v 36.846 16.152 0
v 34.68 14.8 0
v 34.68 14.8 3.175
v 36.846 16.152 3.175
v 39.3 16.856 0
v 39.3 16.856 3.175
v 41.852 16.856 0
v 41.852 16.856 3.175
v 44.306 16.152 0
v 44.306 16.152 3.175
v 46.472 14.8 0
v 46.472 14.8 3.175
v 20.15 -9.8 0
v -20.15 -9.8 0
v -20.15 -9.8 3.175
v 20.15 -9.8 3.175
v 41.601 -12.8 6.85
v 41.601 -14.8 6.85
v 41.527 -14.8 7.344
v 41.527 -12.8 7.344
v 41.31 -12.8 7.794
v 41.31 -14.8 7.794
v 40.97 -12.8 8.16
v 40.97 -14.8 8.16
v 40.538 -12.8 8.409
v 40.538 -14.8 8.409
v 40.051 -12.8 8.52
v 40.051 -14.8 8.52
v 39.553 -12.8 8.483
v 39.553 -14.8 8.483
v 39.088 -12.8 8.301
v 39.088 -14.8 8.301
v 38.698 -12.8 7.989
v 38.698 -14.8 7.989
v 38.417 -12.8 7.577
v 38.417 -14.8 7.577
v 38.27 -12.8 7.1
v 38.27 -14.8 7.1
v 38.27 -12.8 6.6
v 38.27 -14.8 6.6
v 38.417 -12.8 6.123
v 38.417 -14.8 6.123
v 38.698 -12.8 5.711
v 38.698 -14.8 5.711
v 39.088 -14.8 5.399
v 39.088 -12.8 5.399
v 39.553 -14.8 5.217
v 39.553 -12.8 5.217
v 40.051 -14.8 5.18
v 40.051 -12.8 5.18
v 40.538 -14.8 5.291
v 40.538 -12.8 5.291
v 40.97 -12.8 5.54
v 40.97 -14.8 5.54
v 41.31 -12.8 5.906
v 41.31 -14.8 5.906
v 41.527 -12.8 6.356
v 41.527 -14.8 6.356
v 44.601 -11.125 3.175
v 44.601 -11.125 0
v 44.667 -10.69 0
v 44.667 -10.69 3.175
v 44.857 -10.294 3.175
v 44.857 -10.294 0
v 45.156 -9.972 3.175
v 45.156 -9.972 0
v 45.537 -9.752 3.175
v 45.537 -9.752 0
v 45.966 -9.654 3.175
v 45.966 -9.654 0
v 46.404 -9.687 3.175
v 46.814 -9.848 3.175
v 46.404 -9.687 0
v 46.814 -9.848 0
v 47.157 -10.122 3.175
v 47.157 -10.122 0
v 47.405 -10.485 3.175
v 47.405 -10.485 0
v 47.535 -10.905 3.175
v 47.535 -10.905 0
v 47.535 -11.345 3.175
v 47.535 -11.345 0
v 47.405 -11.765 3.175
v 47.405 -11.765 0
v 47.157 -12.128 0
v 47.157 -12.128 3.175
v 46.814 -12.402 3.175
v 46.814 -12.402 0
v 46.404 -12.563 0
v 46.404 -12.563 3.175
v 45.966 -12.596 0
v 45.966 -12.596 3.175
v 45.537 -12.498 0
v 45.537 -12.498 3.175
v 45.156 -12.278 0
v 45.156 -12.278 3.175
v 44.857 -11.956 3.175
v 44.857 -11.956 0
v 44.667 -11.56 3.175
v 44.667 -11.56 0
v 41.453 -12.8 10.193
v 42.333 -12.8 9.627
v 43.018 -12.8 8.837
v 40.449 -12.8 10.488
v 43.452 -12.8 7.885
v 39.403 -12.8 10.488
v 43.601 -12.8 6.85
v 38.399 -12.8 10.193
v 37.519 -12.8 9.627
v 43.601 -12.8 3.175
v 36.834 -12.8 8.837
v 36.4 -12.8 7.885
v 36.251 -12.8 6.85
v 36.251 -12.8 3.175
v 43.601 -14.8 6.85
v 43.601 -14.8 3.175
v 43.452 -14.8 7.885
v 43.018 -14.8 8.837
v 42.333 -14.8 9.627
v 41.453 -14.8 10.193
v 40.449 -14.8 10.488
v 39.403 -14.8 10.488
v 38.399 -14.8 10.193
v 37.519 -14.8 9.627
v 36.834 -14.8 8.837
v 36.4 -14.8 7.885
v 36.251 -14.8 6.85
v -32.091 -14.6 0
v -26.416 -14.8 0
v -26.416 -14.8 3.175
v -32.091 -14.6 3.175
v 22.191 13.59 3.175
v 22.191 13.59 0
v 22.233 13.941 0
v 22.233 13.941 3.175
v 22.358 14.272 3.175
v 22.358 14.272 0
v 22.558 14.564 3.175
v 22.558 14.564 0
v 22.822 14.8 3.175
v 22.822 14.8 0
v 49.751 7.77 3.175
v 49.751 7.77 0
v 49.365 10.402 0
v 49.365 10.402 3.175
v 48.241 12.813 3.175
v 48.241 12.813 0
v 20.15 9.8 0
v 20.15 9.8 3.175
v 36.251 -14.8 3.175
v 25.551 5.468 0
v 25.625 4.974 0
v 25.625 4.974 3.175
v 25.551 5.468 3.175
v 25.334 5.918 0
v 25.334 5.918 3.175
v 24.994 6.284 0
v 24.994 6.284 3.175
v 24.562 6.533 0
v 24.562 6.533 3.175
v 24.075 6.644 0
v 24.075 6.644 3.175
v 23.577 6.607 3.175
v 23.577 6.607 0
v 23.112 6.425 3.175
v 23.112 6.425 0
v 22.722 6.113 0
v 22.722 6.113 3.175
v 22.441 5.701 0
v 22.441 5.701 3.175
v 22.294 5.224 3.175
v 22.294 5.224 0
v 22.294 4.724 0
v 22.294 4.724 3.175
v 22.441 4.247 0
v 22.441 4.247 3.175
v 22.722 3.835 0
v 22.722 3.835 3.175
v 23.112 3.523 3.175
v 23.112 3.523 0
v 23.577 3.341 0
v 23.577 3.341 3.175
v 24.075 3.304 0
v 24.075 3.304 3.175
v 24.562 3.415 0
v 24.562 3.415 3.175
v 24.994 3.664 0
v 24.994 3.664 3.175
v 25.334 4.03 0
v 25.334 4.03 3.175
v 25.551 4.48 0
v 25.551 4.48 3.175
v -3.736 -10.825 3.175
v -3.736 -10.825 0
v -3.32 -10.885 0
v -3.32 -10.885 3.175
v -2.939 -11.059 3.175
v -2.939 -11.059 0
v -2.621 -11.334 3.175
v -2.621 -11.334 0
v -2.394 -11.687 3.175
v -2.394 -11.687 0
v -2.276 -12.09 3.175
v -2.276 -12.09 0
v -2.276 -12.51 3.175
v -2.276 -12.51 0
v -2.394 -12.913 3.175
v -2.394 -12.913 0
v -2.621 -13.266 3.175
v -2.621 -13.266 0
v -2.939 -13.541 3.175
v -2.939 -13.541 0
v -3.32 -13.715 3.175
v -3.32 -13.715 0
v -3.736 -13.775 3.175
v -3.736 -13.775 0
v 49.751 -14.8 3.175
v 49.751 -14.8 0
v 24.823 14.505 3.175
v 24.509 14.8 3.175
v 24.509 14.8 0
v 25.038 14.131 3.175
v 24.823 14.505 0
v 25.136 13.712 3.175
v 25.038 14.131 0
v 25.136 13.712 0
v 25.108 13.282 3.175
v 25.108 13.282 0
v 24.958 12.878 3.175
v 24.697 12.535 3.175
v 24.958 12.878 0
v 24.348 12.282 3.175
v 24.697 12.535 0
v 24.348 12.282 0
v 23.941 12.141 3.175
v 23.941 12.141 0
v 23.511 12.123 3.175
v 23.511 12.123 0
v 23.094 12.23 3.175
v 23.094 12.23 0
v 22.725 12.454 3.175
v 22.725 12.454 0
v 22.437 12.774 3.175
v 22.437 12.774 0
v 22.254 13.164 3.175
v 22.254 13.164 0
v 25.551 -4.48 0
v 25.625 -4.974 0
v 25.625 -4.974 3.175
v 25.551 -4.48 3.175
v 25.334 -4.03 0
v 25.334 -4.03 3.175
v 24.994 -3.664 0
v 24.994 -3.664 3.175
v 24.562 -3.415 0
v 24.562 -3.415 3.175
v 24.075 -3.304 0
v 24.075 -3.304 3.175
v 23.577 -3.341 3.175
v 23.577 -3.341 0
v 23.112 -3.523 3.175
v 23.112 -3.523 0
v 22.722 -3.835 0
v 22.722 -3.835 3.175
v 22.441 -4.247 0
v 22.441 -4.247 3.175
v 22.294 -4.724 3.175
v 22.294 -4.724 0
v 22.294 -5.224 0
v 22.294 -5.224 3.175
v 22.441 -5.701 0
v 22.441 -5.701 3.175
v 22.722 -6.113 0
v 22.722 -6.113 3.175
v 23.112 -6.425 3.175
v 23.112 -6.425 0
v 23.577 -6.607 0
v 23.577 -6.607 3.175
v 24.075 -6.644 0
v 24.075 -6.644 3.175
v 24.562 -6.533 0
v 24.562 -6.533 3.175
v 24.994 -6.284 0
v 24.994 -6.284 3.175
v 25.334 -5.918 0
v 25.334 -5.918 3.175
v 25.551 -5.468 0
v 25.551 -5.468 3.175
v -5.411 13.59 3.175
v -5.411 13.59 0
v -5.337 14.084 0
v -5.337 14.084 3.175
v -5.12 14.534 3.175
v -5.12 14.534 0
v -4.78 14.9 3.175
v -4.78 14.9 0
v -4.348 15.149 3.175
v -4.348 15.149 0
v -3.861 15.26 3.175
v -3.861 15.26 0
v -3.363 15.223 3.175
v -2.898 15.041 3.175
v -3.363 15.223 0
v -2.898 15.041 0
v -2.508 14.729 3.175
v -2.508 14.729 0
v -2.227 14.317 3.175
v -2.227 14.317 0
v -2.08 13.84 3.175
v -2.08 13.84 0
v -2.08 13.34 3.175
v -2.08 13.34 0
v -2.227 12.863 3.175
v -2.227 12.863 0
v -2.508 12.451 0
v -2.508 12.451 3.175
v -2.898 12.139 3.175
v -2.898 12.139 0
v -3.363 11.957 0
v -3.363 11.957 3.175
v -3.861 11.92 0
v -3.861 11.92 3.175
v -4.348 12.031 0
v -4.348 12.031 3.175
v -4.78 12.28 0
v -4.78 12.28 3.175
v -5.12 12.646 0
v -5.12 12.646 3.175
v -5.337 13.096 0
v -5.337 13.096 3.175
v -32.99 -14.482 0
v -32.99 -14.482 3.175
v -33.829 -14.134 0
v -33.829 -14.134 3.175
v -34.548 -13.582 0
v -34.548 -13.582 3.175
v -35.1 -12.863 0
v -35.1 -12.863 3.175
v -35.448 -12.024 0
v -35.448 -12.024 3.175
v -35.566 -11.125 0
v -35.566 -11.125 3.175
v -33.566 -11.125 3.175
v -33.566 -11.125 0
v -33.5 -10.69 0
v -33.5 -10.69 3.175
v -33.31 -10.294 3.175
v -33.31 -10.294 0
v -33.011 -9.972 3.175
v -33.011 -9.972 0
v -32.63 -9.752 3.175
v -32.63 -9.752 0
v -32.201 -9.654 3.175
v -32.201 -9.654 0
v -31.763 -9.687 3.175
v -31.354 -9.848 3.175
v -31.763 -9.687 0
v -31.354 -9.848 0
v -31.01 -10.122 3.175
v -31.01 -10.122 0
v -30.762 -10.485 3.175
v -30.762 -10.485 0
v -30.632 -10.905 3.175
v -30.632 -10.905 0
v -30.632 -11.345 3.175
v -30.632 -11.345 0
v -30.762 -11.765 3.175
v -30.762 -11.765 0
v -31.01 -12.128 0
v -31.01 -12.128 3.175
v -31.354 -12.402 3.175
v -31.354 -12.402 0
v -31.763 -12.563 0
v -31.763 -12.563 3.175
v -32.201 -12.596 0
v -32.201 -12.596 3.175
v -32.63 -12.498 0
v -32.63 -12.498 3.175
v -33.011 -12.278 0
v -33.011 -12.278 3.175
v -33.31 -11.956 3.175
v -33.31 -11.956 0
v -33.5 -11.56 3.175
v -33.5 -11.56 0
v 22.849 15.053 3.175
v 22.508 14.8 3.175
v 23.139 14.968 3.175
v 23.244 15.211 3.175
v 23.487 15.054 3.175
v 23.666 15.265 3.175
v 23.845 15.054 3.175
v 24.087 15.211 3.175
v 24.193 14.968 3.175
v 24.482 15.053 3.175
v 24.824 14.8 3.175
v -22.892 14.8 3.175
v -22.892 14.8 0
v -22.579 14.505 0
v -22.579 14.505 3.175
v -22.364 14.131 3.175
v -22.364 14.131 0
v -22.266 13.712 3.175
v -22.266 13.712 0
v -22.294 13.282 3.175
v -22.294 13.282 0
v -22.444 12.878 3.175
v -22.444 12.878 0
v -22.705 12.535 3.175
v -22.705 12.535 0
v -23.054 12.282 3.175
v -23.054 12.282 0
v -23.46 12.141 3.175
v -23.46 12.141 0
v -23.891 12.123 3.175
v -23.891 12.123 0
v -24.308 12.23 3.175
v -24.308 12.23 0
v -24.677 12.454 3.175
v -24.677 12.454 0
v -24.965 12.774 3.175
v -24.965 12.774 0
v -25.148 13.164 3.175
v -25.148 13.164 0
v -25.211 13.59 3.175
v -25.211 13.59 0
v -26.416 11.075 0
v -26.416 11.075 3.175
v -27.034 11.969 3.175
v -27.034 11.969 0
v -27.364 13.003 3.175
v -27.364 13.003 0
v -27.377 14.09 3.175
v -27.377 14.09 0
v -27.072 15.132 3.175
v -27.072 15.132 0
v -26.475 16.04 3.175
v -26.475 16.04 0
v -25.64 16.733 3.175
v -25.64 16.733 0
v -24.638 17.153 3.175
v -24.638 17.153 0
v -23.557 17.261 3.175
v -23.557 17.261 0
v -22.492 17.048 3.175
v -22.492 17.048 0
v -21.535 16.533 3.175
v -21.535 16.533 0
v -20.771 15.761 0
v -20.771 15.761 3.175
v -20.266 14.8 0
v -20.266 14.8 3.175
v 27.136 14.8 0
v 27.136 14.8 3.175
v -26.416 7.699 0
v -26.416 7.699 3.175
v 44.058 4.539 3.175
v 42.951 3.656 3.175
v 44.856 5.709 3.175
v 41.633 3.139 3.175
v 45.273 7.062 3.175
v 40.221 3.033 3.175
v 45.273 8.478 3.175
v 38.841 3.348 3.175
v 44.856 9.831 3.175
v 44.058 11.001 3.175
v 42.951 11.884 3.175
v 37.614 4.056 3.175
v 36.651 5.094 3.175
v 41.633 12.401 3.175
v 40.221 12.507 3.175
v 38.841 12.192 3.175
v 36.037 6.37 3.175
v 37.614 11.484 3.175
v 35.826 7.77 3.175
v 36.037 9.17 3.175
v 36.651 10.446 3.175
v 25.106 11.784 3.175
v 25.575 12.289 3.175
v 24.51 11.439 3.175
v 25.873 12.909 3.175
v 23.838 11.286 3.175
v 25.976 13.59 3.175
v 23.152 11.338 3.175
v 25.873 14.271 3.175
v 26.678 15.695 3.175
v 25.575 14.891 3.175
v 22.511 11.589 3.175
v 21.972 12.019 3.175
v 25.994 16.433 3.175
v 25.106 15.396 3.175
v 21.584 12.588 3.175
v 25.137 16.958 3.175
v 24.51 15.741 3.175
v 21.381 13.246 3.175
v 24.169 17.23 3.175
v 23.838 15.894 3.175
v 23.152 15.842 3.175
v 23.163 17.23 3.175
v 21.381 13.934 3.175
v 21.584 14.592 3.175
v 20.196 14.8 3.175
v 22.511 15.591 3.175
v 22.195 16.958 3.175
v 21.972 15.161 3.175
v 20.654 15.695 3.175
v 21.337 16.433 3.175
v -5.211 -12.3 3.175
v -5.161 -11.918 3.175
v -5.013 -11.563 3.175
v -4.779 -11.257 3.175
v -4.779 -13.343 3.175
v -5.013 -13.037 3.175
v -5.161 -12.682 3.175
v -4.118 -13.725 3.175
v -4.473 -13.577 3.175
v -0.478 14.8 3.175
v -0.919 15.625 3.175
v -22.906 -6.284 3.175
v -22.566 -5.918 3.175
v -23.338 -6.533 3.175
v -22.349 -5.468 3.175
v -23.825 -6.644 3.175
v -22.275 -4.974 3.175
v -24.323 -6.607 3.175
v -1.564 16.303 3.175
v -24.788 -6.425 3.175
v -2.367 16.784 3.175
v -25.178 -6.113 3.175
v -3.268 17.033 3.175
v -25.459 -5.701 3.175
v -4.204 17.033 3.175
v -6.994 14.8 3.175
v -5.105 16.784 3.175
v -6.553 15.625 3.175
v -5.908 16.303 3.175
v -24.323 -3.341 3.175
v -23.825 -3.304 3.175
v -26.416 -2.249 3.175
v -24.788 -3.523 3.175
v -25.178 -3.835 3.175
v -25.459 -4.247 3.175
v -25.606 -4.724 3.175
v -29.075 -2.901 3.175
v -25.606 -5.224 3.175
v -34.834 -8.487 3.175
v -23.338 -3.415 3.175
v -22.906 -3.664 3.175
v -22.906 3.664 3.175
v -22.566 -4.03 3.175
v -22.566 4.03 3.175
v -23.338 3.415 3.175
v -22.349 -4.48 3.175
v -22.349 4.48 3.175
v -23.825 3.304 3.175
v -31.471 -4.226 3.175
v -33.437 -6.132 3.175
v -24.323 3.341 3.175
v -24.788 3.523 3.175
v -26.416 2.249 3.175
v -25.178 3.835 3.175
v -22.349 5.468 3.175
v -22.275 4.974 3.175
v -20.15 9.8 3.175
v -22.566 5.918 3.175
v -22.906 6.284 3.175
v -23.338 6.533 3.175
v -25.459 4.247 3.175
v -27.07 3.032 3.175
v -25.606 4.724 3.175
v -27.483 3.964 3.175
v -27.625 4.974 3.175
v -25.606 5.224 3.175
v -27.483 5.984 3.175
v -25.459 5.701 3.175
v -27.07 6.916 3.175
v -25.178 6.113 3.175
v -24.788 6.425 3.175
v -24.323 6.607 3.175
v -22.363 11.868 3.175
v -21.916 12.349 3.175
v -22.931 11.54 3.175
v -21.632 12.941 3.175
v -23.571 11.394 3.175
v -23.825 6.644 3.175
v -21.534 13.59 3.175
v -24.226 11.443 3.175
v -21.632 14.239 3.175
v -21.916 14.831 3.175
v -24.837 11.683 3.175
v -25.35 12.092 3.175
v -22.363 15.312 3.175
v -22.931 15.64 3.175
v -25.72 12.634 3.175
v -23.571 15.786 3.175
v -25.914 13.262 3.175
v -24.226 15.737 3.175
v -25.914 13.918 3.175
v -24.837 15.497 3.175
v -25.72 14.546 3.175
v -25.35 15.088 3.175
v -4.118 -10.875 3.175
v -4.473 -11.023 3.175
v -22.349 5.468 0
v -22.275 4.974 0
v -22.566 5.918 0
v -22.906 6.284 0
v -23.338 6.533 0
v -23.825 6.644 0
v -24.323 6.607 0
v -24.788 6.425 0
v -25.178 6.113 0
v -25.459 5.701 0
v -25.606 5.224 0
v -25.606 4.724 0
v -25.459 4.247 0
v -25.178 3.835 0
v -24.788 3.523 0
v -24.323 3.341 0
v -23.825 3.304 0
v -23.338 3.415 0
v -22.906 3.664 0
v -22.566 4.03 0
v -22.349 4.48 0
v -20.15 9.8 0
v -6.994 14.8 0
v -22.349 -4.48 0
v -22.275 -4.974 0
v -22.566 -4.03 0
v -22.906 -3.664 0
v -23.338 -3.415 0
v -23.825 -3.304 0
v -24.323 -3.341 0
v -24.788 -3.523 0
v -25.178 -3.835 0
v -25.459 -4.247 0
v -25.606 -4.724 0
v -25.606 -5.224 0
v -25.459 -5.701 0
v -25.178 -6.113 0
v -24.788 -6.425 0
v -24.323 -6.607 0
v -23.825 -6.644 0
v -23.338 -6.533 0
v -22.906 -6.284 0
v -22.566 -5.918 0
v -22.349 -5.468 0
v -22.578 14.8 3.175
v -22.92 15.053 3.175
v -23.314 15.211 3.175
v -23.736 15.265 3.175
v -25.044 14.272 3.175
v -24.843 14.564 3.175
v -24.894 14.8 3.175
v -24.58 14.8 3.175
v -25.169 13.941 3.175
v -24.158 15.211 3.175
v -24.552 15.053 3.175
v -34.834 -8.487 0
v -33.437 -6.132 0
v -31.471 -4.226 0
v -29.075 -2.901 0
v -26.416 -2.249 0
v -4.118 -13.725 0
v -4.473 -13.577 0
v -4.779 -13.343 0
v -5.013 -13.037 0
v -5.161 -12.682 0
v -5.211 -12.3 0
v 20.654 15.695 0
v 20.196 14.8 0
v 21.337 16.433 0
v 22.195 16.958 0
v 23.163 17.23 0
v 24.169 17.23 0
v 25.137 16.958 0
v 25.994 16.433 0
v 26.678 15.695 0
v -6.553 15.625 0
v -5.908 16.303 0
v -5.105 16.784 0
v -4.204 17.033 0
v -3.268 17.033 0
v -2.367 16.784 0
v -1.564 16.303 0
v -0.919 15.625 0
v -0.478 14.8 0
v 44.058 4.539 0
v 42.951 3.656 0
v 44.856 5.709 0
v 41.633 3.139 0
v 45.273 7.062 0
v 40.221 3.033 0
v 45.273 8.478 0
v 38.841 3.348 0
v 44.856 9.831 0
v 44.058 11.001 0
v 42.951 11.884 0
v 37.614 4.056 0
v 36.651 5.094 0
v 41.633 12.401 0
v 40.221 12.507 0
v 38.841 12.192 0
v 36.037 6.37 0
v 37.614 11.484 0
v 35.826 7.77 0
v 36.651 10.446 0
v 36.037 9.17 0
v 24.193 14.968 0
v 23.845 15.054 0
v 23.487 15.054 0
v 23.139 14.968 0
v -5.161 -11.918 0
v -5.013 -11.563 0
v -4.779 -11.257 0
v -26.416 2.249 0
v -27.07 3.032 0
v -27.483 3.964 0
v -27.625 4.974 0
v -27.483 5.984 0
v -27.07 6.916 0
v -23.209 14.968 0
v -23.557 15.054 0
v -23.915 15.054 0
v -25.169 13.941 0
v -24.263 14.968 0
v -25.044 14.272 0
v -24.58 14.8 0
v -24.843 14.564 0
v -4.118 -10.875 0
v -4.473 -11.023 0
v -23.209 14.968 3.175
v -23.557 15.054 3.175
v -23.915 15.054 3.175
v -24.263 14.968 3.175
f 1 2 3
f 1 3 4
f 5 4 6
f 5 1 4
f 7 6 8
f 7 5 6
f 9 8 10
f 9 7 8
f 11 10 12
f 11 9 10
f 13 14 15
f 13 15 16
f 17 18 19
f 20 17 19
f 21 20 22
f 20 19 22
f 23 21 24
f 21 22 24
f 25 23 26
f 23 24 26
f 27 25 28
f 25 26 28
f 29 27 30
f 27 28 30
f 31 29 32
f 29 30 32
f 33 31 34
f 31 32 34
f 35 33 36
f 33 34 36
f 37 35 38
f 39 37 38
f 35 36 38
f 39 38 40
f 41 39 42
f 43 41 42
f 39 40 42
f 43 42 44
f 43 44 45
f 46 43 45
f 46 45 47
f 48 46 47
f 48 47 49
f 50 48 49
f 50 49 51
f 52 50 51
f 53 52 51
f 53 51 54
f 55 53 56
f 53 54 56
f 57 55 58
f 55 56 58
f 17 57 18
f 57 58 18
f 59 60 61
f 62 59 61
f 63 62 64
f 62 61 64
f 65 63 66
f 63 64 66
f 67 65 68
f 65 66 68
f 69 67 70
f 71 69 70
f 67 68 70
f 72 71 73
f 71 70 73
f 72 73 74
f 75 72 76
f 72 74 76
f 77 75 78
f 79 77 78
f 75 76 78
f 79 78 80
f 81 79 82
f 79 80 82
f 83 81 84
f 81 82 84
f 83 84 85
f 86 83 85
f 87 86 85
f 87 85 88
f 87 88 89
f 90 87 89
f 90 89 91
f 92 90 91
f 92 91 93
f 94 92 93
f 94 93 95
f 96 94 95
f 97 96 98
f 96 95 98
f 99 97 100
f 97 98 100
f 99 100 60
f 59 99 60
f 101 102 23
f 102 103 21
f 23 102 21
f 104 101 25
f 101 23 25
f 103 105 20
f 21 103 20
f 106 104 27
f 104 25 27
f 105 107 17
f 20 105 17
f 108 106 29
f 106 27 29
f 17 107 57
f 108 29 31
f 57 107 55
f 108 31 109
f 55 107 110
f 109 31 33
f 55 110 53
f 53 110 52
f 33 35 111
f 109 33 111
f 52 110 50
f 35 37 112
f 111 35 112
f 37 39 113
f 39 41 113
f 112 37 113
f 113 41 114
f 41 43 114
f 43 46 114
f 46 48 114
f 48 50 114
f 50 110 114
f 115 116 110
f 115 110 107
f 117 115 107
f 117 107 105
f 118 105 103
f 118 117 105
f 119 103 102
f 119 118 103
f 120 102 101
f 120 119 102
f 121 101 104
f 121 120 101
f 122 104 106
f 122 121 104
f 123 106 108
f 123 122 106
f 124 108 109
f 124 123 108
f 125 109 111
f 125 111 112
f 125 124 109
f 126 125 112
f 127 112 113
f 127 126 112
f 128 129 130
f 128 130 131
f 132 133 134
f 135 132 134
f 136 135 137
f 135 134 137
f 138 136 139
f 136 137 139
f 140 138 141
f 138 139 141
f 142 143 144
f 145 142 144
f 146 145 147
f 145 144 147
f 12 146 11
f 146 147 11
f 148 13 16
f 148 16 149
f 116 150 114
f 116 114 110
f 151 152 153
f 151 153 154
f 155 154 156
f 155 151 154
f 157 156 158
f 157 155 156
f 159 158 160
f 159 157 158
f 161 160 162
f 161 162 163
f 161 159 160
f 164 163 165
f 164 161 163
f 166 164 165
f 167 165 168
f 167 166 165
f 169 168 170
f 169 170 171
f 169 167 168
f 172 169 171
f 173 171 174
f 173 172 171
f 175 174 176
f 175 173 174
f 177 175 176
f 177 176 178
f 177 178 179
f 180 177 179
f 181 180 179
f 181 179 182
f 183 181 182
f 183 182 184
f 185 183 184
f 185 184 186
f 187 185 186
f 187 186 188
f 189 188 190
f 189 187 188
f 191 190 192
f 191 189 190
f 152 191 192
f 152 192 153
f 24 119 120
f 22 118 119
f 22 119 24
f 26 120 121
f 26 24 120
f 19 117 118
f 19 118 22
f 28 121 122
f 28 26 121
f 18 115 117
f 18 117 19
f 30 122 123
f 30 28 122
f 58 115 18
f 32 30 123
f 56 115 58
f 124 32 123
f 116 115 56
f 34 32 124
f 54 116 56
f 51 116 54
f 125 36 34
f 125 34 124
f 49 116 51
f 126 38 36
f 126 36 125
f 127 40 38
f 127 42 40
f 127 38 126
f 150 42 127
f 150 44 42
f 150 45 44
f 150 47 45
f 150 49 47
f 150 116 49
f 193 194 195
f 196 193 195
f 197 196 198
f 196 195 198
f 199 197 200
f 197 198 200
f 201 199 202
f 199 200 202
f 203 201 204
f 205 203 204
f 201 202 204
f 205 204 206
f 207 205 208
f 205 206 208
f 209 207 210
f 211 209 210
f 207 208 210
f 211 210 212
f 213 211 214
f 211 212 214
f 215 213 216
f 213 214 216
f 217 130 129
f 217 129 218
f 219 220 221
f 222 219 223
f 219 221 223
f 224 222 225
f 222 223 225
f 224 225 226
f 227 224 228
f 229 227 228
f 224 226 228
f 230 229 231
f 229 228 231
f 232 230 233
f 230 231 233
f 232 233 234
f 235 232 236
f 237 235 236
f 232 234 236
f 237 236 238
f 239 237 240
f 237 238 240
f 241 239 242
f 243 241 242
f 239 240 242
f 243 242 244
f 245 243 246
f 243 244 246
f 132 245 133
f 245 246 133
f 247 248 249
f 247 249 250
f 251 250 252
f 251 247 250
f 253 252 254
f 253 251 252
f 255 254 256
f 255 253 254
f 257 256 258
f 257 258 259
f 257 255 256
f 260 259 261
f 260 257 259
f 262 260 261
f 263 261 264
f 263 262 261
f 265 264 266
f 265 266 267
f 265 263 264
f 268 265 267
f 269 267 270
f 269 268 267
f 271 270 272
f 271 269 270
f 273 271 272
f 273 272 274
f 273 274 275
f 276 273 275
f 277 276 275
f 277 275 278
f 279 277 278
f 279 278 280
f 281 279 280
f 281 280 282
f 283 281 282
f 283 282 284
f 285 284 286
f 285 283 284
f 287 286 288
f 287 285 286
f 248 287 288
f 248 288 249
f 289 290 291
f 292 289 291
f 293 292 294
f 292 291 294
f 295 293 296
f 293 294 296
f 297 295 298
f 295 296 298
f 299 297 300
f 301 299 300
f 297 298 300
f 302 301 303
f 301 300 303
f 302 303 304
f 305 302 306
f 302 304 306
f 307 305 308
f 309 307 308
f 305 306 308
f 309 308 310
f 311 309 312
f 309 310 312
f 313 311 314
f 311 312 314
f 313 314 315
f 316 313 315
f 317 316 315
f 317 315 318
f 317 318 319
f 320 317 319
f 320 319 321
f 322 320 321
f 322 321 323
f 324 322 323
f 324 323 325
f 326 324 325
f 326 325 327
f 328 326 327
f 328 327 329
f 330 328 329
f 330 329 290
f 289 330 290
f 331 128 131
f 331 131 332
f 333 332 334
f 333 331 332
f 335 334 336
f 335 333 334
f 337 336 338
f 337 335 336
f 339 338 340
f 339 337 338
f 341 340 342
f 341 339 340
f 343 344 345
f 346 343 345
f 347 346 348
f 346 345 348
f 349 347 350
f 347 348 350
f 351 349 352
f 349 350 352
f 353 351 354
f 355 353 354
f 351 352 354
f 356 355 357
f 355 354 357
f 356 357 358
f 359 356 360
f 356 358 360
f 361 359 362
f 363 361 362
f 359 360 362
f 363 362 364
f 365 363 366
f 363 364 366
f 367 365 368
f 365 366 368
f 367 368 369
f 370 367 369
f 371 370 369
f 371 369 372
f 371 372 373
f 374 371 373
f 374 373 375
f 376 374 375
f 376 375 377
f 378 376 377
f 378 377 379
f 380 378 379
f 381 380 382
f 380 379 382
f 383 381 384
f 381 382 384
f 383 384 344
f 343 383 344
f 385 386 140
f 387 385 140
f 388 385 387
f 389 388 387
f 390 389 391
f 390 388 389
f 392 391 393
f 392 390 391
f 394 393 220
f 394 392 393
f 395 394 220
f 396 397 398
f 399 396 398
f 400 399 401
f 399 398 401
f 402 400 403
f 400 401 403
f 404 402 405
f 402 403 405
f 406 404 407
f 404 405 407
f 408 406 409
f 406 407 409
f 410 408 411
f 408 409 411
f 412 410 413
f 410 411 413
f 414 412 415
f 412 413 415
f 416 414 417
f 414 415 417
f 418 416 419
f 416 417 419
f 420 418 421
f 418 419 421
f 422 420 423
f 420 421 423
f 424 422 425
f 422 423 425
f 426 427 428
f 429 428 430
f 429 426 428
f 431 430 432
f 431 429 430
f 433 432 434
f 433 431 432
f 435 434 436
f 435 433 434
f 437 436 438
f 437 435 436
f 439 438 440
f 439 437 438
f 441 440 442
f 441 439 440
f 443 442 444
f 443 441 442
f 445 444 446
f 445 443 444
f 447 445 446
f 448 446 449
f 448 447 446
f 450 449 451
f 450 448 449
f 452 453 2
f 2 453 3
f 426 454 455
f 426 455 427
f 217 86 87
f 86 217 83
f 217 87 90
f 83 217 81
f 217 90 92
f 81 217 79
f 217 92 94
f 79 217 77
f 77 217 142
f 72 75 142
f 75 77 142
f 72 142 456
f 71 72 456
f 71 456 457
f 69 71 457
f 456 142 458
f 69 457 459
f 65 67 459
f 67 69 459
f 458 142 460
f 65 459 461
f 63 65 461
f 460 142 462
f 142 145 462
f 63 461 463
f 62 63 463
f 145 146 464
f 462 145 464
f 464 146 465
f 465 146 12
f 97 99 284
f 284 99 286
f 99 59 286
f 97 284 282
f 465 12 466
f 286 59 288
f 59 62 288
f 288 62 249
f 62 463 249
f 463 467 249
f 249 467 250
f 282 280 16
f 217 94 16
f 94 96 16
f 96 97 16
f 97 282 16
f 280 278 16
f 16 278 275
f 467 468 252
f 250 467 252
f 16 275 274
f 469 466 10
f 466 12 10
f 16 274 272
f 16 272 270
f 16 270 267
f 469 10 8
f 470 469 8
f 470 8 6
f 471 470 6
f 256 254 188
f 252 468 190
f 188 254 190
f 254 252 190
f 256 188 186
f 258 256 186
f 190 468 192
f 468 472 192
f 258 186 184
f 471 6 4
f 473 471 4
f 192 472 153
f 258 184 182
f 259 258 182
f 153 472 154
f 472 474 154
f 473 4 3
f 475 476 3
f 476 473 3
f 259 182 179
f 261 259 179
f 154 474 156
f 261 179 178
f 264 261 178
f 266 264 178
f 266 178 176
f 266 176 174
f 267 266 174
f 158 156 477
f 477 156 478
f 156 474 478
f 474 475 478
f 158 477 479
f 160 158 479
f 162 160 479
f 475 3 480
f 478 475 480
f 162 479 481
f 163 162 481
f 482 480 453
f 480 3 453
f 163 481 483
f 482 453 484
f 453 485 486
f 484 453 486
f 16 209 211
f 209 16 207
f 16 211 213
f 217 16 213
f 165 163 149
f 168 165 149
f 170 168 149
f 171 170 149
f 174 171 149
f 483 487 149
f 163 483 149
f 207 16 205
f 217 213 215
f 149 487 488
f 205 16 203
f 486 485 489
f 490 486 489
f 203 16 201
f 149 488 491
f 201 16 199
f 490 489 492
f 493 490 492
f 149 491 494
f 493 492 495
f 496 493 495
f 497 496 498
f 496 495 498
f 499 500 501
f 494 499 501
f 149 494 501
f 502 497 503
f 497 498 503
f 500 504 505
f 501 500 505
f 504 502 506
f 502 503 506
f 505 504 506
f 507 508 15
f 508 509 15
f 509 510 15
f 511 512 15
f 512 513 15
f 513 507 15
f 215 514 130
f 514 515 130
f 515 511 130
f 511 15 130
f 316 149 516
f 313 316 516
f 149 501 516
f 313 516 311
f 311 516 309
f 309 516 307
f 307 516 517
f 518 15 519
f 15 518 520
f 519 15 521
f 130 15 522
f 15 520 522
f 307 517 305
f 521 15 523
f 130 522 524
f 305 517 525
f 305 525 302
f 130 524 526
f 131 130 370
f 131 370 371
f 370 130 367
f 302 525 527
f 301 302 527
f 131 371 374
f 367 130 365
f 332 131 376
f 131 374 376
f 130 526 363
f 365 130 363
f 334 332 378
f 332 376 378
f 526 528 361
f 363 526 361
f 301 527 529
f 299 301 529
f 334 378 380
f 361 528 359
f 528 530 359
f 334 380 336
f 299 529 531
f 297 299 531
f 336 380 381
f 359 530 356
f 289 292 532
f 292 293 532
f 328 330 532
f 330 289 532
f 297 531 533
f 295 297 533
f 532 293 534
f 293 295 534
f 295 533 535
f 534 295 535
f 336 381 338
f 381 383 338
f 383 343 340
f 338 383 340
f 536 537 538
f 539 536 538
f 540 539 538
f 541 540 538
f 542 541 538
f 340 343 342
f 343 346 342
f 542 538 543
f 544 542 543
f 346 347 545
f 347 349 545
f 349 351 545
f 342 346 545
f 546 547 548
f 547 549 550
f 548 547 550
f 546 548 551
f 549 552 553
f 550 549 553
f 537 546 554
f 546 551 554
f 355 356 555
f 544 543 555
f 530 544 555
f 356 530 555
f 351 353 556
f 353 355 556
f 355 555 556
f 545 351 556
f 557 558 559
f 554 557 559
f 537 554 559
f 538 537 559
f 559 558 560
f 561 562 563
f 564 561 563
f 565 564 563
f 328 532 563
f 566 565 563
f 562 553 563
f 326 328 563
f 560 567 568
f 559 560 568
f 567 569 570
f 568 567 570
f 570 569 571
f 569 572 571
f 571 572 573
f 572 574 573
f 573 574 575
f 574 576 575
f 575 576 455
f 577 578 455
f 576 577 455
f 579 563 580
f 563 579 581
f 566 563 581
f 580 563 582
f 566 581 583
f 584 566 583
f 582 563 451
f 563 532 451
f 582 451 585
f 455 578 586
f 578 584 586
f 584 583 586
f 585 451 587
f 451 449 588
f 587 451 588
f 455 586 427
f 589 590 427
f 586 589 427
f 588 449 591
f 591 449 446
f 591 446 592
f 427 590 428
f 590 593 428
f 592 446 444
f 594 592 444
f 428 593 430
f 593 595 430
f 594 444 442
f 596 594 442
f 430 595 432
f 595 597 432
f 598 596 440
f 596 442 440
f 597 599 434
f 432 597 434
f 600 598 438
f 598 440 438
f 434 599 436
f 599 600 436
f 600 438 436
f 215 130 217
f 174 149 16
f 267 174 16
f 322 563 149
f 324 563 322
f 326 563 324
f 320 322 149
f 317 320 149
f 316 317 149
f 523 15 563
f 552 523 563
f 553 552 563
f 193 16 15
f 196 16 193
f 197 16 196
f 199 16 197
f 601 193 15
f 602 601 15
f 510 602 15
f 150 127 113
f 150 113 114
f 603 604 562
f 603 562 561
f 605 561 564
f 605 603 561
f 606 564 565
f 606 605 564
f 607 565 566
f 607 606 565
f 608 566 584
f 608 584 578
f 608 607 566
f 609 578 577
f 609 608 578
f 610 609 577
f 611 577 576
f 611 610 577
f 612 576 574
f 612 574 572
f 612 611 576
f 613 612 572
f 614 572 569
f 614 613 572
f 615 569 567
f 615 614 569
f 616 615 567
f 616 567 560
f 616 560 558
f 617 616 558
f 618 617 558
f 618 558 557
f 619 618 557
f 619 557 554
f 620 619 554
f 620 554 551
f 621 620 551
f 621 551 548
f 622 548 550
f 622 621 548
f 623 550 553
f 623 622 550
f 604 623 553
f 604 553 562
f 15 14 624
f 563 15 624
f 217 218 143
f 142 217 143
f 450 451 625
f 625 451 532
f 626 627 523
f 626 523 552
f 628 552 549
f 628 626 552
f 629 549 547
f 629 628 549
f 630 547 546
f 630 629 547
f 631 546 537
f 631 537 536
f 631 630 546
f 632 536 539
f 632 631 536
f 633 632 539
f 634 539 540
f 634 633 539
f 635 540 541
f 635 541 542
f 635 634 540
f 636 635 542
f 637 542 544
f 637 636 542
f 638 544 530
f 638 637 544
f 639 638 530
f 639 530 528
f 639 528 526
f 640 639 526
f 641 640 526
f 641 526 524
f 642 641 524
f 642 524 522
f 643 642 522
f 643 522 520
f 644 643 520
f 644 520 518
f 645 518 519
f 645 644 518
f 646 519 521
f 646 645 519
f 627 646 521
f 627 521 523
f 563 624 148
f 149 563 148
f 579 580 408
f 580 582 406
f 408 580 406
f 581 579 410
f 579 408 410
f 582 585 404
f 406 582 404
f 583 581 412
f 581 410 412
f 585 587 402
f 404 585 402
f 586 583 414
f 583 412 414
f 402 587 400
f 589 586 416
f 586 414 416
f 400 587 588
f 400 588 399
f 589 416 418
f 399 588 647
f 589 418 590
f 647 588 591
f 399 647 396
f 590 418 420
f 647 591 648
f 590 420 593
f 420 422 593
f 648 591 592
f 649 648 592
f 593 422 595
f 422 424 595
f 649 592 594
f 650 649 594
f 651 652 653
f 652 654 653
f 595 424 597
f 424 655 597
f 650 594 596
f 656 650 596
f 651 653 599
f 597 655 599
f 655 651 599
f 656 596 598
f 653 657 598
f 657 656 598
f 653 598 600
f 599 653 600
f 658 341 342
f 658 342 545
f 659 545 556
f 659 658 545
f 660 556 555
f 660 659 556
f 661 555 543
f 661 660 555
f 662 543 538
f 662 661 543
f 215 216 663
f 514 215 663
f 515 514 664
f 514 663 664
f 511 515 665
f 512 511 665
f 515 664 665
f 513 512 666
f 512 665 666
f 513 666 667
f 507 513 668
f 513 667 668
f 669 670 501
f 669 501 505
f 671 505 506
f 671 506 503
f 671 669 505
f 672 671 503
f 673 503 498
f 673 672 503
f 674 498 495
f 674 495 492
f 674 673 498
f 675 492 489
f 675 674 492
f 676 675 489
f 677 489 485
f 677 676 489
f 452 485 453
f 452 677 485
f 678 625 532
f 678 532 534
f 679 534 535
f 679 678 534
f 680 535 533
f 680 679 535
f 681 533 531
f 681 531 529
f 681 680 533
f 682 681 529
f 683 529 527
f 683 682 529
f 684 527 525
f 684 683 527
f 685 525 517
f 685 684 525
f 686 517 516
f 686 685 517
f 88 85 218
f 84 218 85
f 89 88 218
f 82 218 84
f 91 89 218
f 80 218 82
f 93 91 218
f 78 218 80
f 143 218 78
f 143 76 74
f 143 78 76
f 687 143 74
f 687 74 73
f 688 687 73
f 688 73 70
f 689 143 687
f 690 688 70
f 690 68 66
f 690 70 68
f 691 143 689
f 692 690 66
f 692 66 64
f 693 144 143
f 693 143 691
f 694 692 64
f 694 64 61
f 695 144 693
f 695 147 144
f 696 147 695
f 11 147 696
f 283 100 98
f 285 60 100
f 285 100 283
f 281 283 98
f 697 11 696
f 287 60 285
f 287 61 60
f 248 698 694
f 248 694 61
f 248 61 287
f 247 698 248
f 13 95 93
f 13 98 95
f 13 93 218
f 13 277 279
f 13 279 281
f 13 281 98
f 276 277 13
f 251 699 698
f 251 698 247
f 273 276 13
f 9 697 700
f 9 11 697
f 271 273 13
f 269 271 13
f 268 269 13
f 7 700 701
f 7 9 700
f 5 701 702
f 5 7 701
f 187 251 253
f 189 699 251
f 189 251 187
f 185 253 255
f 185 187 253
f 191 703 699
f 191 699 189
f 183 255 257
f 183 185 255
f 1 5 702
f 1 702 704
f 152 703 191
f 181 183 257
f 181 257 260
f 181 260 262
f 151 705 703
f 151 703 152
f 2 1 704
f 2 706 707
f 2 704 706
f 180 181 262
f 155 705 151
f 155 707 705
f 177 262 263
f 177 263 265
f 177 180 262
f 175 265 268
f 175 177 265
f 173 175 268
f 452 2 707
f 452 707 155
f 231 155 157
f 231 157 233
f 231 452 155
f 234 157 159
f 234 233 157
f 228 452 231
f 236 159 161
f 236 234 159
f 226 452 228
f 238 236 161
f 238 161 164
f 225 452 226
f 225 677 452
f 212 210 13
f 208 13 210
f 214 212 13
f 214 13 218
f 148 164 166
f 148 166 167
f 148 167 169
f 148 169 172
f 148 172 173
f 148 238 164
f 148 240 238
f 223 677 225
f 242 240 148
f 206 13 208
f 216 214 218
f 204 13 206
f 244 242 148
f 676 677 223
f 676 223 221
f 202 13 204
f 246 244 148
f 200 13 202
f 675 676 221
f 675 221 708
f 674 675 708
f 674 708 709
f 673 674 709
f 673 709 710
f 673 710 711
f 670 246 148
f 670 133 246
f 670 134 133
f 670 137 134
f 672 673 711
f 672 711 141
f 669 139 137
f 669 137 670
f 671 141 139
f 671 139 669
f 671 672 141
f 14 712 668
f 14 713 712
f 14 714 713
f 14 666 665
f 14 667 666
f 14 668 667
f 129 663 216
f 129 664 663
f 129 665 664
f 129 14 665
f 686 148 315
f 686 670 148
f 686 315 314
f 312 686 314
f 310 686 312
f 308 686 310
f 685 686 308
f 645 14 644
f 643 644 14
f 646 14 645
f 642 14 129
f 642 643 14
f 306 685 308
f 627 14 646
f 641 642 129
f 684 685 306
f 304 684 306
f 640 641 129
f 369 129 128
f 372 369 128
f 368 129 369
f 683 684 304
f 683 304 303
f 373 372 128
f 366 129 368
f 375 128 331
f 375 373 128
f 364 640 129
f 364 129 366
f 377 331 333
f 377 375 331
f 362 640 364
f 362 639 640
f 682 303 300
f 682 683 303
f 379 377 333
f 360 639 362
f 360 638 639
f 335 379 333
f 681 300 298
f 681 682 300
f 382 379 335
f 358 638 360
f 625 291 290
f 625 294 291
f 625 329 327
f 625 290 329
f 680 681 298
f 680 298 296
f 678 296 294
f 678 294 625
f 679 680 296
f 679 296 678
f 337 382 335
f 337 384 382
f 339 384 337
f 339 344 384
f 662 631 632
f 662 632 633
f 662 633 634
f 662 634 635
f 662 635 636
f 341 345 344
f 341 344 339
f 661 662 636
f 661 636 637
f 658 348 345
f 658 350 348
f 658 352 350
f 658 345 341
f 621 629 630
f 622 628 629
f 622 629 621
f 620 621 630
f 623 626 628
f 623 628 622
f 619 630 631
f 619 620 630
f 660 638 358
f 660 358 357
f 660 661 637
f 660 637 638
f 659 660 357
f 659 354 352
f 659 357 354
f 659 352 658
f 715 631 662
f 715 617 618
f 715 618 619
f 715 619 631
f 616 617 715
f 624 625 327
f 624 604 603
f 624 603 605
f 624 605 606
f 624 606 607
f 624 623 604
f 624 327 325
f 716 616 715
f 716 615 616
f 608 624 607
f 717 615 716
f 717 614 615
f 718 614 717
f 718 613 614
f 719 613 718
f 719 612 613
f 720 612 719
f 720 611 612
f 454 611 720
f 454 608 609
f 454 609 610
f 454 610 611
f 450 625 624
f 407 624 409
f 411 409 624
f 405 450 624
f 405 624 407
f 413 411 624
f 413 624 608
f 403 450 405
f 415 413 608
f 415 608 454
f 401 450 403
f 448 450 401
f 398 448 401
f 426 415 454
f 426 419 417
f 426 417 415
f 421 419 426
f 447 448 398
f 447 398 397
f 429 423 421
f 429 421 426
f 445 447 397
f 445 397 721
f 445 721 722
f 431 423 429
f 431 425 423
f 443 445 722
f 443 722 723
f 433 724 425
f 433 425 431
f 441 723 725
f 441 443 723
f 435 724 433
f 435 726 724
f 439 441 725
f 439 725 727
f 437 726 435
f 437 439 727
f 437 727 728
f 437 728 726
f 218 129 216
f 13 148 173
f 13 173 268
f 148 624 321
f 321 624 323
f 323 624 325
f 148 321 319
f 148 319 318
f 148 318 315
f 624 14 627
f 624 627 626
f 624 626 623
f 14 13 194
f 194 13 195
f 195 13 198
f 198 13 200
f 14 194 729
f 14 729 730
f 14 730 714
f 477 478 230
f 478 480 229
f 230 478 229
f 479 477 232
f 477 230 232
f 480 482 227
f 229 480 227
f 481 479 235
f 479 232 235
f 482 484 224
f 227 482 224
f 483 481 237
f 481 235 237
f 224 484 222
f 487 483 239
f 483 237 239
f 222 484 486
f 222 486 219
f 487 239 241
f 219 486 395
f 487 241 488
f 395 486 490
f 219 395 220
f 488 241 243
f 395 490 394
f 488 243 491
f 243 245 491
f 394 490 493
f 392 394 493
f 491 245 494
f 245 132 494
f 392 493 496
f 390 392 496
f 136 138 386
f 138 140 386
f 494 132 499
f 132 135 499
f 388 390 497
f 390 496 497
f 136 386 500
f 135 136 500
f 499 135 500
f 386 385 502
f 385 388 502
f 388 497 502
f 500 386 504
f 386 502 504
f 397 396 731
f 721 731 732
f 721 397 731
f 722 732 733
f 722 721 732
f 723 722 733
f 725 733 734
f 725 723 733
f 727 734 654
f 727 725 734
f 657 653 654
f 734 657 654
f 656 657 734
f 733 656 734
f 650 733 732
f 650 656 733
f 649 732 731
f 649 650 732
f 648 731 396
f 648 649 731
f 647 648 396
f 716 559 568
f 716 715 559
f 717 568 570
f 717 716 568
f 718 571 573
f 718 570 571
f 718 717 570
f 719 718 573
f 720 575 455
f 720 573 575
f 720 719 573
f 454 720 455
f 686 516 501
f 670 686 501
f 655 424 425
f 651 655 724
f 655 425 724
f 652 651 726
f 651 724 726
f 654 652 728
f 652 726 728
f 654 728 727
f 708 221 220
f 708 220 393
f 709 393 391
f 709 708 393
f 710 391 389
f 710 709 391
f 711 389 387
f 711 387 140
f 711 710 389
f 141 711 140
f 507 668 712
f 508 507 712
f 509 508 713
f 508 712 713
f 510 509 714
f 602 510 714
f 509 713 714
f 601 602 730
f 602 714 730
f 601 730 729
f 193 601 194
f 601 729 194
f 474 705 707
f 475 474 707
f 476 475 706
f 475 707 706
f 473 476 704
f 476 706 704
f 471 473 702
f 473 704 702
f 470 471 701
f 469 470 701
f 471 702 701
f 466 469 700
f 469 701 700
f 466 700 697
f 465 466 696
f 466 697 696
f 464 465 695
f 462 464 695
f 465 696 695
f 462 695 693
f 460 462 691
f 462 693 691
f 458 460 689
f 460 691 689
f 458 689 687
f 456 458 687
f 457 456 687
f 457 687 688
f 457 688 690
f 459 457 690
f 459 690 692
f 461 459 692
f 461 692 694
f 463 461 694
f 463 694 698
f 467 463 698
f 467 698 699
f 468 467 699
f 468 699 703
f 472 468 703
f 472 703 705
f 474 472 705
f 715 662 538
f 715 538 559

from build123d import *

# Parameters (mm, degrees)
SKETCH1_W            = 6.266
SKETCH1_H            = 19.6
SKETCH1_R            = 1.675
SKETCH1_W_2          = 52.832
SKETCH1_H_2          = 5
BOSS_EXTRUDE2_DEPTH  = 3.175
SKETCH3_W            = 30
SKETCH3_H            = 29.6
BOSS_EXTRUDE3_DEPTH  = 3.175
SKETCH4_R            = 4.75
CUT_EXTRUDE1_DEPTH   = 10
BOSS_EXTRUDE14_DEPTH = 3.175
CUT_EXTRUDE8_DEPTH   = 10
SKETCH24_R           = 1.475
CUT_EXTRUDE9_DEPTH   = 10
SKETCH25_R           = 3.675
SKETCH25_R_2         = 1.675
BOSS_EXTRUDE15_DEPTH = 3.175
SKETCH26_R           = 1.475
CUT_EXTRUDE12_DEPTH  = 3.175
CUT_EXTRUDE13_DEPTH  = 10
SKETCH28_R           = 3.675
SKETCH28_R_2         = 1.675
BOSS_EXTRUDE16_DEPTH = 3.175
SKETCH29_R           = 1.475
BOSS_EXTRUDE17_DEPTH = 3.175
BOSS_EXTRUDE19_DEPTH = 3.175
SKETCH32_R           = 1.675
CUT_EXTRUDE14_DEPTH  = 53.757206626
CUT_EXTRUDE15_DEPTH  = 53.757206626
BOSS_EXTRUDE20_START = -3.175
SKETCH34_R           = 2.202287172
SKETCH34_R_2         = 1.475
SKETCH34_R_3         = 2.310224014
BOSS_EXTRUDE20_DEPTH = 3.175
SKETCH30_R           = 3.675
SKETCH30_R_2         = 1.675
BOSS_EXTRUDE18_DEPTH = 2


with BuildPart() as part:
    # Sketch1 → Boss-Extrude2 (new body)
    # profile 1 of 4: a face of its own
    with BuildSketch(Plane.XY):
        with Locations((-23.283, 0)):
            Rectangle(SKETCH1_W, SKETCH1_H)
        with Locations((-23.95, -4.974)):
            Circle(SKETCH1_R, mode=Mode.SUBTRACT)
        with Locations((-23.95, 4.974)):
            Circle(SKETCH1_R, mode=Mode.SUBTRACT)
    # profile 2 of 4: a face of its own
    with BuildSketch(Plane.XY):
        with Locations((0, -12.3)):
            Rectangle(SKETCH1_W_2, SKETCH1_H_2)
    # profile 3 of 4: a face of its own
    with BuildSketch(Plane.XY):
        with Locations((0, 12.3)):
            Rectangle(SKETCH1_W_2, SKETCH1_H_2)
    # profile 4 of 4: a face of its own
    with BuildSketch(Plane.XY):
        with Locations((23.283, 0)):
            Rectangle(SKETCH1_W, SKETCH1_H)
        with Locations((23.95, -4.974)):
            Circle(SKETCH1_R, mode=Mode.SUBTRACT)
        with Locations((23.95, 4.974)):
            Circle(SKETCH1_R, mode=Mode.SUBTRACT)
    extrude(amount=BOSS_EXTRUDE2_DEPTH)

    # Sketch3 → Boss-Extrude3 (add)
    with BuildSketch(Plane.XY.offset(3.175)):
        with Locations((41.416, 0)):
            Rectangle(SKETCH3_W, SKETCH3_H)
    extrude(amount=-BOSS_EXTRUDE3_DEPTH)

    # Sketch4 → Cut-Extrude1 (cut)
    with BuildSketch(Plane(origin=(0, 0, 0), x_dir=(-1, 0, 0), z_dir=(0, 0, -1))):
        with Locations((-40.576, 7.77)):
            Circle(SKETCH4_R)
    extrude(amount=-CUT_EXTRUDE1_DEPTH, mode=Mode.SUBTRACT)

    # Sketch22 → Boss-Extrude14 (add)
    with BuildSketch(Plane(origin=(0, 0, 0), x_dir=(-1, 0, 0), z_dir=(0, 0, -1))):
        with BuildLine():
            ThreePointArc((-34.680262133, 14.8), (-40.576, 16.945), (-46.471737867, 14.8))
            Line((-46.471737867, 14.8), (-34.680262133, 14.8))
        make_face()
    extrude(amount=-BOSS_EXTRUDE14_DEPTH)

    # Sketch23 → Cut-Extrude8 (cut)
    with BuildSketch(Plane(origin=(0, 0, 0), x_dir=(-1, 0, 0), z_dir=(0, 0, -1))):
        with BuildLine():
            Line((-49.751, -14.8), (-49.751, 7.77))
            ThreePointArc((-49.751, 7.77), (-48.890866804, 11.648609936), (-46.471737867, 14.8))
            Line((-46.471737867, 14.8), (-56.416, 14.8))
            Line((-56.416, 14.8), (-56.416, -14.8))
            Line((-56.416, -14.8), (-49.751, -14.8))
        make_face()
    extrude(amount=-CUT_EXTRUDE8_DEPTH, mode=Mode.SUBTRACT)

    # Sketch24 → Cut-Extrude9 (cut)
    with BuildSketch(Plane(origin=(0, 0, 0), x_dir=(-1, 0, 0), z_dir=(0, 0, -1))):
        with Locations((23.736, 13.59)):
            Circle(SKETCH24_R)
    extrude(amount=-CUT_EXTRUDE9_DEPTH, mode=Mode.SUBTRACT)

    # Sketch25 → Boss-Extrude15 (add)
    # profile 1 of 3: a face of its own
    with BuildSketch(Plane(origin=(0, 0, 0), x_dir=(-1, 0, 0), z_dir=(0, 0, -1))):
        with Locations((23.95, -4.974)):
            Circle(SKETCH25_R)
        with Locations(Location((23.95, -4.974, 0), (0, 0, 180))):
            Circle(SKETCH25_R_2, mode=Mode.SUBTRACT)
    # profile 2 of 3: a face of its own
    with BuildSketch(Plane(origin=(0, 0, 0), x_dir=(-1, 0, 0), z_dir=(0, 0, -1))):
        with Locations((23.95, 4.974)):
            Circle(SKETCH25_R)
        with Locations(Location((23.95, 4.974, 0), (0, 0, 180))):
            Circle(SKETCH25_R_2, mode=Mode.SUBTRACT)
    # profile 3 of 3: a face of its own
    with BuildSketch(Plane(origin=(0, 0, 0), x_dir=(-1, 0, 0), z_dir=(0, 0, -1))):
        with Locations((23.736, 13.59)):
            Circle(SKETCH25_R)
        with Locations((23.736, 13.59)):
            Circle(SKETCH25_R_2, mode=Mode.SUBTRACT)
    extrude(amount=-BOSS_EXTRUDE15_DEPTH)

    # Sketch26 → Cut-Extrude12 (cut)
    with BuildSketch(Plane(origin=(0, 0, 0), x_dir=(-1, 0, 0), z_dir=(0, 0, -1))):
        with Locations((-46.076, -11.125)):
            Circle(SKETCH26_R)
    extrude(amount=-CUT_EXTRUDE12_DEPTH, mode=Mode.SUBTRACT)

    # Sketch27 → Cut-Extrude13 (cut)
    with BuildSketch(Plane(origin=(0, 0, 0), x_dir=(-1, 0, 0), z_dir=(0, 0, -1))):
        with BuildLine():
            ThreePointArc((-22.190754209, 13.59), (-22.358119678, 14.272434563), (-22.822234796, 14.8))
            Line((-22.822234796, 14.8), (-24.509273622, 14.8))
            ThreePointArc((-24.509273622, 14.8), (-24.348188772, 12.282365469), (-22.190754209, 13.59))
        make_face()
        with BuildLine():
            Line((-24.509273622, 14.8), (-22.822234796, 14.8))
            ThreePointArc((-22.822234796, 14.8), (-23.665754209, 15.065), (-24.509273622, 14.8))
        make_face()
    extrude(amount=-CUT_EXTRUDE13_DEPTH, mode=Mode.SUBTRACT)

    # Sketch28 → Boss-Extrude16 (add)
    with BuildSketch(Plane(origin=(0, 0, 0), x_dir=(-1, 0, 0), z_dir=(0, 0, -1))):
        with Locations((-23.665754209, 13.59)):
            Circle(SKETCH28_R)
        with Locations((-23.665754209, 13.59)):
            Circle(SKETCH28_R_2, mode=Mode.SUBTRACT)
    extrude(amount=-BOSS_EXTRUDE16_DEPTH)

    # Sketch29 → Boss-Extrude17 (add)
    with BuildSketch(Plane(origin=(0, 0, 0), x_dir=(-1, 0, 0), z_dir=(0, 0, -1))):
        with BuildLine():
            ThreePointArc((35.566, -11.125), (32.517318638, -5.113632727), (26.416, -2.249212118))
            Line((26.416, -2.249212118), (26.416, -14.8))
            Line((26.416, -14.8), (32.091, -14.6))
            ThreePointArc((32.091, -14.6), (34.548196065, -13.582196065), (35.566, -11.125))
        make_face()
        with Locations((32.091, -11.125)):
            Circle(SKETCH29_R, mode=Mode.SUBTRACT)
    extrude(amount=-BOSS_EXTRUDE17_DEPTH)

    # Sketch31 → Boss-Extrude19 (add)
    with BuildSketch(Plane(origin=(0, 0, 0), x_dir=(-1, 0, 0), z_dir=(0, 0, -1))):
        with BuildLine():
            ThreePointArc((4.579519413, 14.8), (5.043634531, 14.272434563), (5.211, 13.59))
            ThreePointArc((5.211, 13.59), (3.053565437, 12.282365469), (2.892480587, 14.8))
            Line((2.892480587, 14.8), (0.478466424, 14.8))
            ThreePointArc((0.478466424, 14.8), (3.121306653, 10.169798677), (7.211, 13.59))
            ThreePointArc((7.211, 13.59), (7.156201323, 14.204693347), (6.993533576, 14.8))
            Line((6.993533576, 14.8), (4.579519413, 14.8))
        make_face()
        with BuildLine():
            ThreePointArc((2.892480587, 14.8), (3.736, 15.065), (4.579519413, 14.8))
            Line((4.579519413, 14.8), (6.993533576, 14.8))
            ThreePointArc((6.993533576, 14.8), (3.736, 17.065), (0.478466424, 14.8))
            Line((0.478466424, 14.8), (2.892480587, 14.8))
        make_face()
    extrude(amount=-BOSS_EXTRUDE19_DEPTH)

    # Sketch32 → Cut-Extrude14 (cut, through all)
    with BuildSketch(Plane(origin=(0, 0, 0), x_dir=(-1, 0, 0), z_dir=(0, 0, -1))):
        with Locations((3.736, 13.59)):
            Circle(SKETCH32_R)
    extrude(amount=-CUT_EXTRUDE14_DEPTH, mode=Mode.SUBTRACT)

    # Sketch33 → Cut-Extrude15 (cut, through all)
    with BuildSketch(Plane(origin=(0, 0, 0), x_dir=(-1, 0, 0), z_dir=(0, 0, -1))):
        with BuildLine():
            ThreePointArc((5.211, -12.3), (4.778982502, -11.257017498), (3.736, -10.825))
            Line((3.736, -10.825), (3.736, -13.775))
            ThreePointArc((3.736, -13.775), (4.778982502, -13.342982502), (5.211, -12.3))
        make_face()
        with BuildLine():
            Line((3.736, -13.775), (3.736, -10.825))
            ThreePointArc((3.736, -10.825), (2.261, -12.3), (3.736, -13.775))
        make_face()
    extrude(amount=-CUT_EXTRUDE15_DEPTH, mode=Mode.SUBTRACT)

    # Sketch34 → Boss-Extrude20 (add)
    # profile 1 of 2: a face of its own
    with BuildSketch(Plane.XY.offset(3.175).offset(BOSS_EXTRUDE20_START)):
        with Locations((-23.736, 13.59)):
            Circle(SKETCH34_R)
        with Locations(Location((-23.736, 13.59, 0), (0, 0, 180))):
            Circle(SKETCH34_R_2, mode=Mode.SUBTRACT)
    # profile 2 of 2: a face of its own
    with BuildSketch(Plane.XY.offset(3.175).offset(BOSS_EXTRUDE20_START)):
        with Locations((23.665754209, 13.59)):
            Circle(SKETCH34_R_3)
        with Locations(Location((23.665754209, 13.59, 0), (0, 0, 180))):
            Circle(SKETCH34_R_2, mode=Mode.SUBTRACT)
    extrude(amount=BOSS_EXTRUDE20_DEPTH)


with BuildPart() as body_2:
    # Sketch30 → Boss-Extrude18 (new body)
    # profile 1 of 3: a face of its own
    with BuildSketch(Plane(origin=(0, -14.8, 0), x_dir=(-1, 0, 0), z_dir=(0, -1, 0))):
        with Locations((-39.926, -6.85)):
            Circle(SKETCH30_R)
        with Locations(Location((-39.926, -6.85, 0), (0, 0, 180))):
            Circle(SKETCH30_R_2, mode=Mode.SUBTRACT)
    # profile 2 of 3: a face of its own
    with BuildSketch(Plane(origin=(0, -14.8, 0), x_dir=(-1, 0, 0), z_dir=(0, -1, 0))):
        with BuildLine():
            Line((-43.601, -3.175), (-43.601, -6.85))
            ThreePointArc((-43.601, -6.85), (-42.524617421, -4.251382579), (-39.926, -3.175))
            Line((-39.926, -3.175), (-43.601, -3.175))
        make_face()
    # profile 3 of 3: a face of its own
    with BuildSketch(Plane(origin=(0, -14.8, 0), x_dir=(-1, 0, 0), z_dir=(0, -1, 0))):
        with BuildLine():
            ThreePointArc((-39.926, -3.175), (-37.327382579, -4.251382579), (-36.251, -6.85))
            Line((-36.251, -6.85), (-36.251, -3.175))
            Line((-36.251, -3.175), (-39.926, -3.175))
        make_face()
    extrude(amount=-BOSS_EXTRUDE18_DEPTH)


solid = Compound([part.part, body_2.part])
